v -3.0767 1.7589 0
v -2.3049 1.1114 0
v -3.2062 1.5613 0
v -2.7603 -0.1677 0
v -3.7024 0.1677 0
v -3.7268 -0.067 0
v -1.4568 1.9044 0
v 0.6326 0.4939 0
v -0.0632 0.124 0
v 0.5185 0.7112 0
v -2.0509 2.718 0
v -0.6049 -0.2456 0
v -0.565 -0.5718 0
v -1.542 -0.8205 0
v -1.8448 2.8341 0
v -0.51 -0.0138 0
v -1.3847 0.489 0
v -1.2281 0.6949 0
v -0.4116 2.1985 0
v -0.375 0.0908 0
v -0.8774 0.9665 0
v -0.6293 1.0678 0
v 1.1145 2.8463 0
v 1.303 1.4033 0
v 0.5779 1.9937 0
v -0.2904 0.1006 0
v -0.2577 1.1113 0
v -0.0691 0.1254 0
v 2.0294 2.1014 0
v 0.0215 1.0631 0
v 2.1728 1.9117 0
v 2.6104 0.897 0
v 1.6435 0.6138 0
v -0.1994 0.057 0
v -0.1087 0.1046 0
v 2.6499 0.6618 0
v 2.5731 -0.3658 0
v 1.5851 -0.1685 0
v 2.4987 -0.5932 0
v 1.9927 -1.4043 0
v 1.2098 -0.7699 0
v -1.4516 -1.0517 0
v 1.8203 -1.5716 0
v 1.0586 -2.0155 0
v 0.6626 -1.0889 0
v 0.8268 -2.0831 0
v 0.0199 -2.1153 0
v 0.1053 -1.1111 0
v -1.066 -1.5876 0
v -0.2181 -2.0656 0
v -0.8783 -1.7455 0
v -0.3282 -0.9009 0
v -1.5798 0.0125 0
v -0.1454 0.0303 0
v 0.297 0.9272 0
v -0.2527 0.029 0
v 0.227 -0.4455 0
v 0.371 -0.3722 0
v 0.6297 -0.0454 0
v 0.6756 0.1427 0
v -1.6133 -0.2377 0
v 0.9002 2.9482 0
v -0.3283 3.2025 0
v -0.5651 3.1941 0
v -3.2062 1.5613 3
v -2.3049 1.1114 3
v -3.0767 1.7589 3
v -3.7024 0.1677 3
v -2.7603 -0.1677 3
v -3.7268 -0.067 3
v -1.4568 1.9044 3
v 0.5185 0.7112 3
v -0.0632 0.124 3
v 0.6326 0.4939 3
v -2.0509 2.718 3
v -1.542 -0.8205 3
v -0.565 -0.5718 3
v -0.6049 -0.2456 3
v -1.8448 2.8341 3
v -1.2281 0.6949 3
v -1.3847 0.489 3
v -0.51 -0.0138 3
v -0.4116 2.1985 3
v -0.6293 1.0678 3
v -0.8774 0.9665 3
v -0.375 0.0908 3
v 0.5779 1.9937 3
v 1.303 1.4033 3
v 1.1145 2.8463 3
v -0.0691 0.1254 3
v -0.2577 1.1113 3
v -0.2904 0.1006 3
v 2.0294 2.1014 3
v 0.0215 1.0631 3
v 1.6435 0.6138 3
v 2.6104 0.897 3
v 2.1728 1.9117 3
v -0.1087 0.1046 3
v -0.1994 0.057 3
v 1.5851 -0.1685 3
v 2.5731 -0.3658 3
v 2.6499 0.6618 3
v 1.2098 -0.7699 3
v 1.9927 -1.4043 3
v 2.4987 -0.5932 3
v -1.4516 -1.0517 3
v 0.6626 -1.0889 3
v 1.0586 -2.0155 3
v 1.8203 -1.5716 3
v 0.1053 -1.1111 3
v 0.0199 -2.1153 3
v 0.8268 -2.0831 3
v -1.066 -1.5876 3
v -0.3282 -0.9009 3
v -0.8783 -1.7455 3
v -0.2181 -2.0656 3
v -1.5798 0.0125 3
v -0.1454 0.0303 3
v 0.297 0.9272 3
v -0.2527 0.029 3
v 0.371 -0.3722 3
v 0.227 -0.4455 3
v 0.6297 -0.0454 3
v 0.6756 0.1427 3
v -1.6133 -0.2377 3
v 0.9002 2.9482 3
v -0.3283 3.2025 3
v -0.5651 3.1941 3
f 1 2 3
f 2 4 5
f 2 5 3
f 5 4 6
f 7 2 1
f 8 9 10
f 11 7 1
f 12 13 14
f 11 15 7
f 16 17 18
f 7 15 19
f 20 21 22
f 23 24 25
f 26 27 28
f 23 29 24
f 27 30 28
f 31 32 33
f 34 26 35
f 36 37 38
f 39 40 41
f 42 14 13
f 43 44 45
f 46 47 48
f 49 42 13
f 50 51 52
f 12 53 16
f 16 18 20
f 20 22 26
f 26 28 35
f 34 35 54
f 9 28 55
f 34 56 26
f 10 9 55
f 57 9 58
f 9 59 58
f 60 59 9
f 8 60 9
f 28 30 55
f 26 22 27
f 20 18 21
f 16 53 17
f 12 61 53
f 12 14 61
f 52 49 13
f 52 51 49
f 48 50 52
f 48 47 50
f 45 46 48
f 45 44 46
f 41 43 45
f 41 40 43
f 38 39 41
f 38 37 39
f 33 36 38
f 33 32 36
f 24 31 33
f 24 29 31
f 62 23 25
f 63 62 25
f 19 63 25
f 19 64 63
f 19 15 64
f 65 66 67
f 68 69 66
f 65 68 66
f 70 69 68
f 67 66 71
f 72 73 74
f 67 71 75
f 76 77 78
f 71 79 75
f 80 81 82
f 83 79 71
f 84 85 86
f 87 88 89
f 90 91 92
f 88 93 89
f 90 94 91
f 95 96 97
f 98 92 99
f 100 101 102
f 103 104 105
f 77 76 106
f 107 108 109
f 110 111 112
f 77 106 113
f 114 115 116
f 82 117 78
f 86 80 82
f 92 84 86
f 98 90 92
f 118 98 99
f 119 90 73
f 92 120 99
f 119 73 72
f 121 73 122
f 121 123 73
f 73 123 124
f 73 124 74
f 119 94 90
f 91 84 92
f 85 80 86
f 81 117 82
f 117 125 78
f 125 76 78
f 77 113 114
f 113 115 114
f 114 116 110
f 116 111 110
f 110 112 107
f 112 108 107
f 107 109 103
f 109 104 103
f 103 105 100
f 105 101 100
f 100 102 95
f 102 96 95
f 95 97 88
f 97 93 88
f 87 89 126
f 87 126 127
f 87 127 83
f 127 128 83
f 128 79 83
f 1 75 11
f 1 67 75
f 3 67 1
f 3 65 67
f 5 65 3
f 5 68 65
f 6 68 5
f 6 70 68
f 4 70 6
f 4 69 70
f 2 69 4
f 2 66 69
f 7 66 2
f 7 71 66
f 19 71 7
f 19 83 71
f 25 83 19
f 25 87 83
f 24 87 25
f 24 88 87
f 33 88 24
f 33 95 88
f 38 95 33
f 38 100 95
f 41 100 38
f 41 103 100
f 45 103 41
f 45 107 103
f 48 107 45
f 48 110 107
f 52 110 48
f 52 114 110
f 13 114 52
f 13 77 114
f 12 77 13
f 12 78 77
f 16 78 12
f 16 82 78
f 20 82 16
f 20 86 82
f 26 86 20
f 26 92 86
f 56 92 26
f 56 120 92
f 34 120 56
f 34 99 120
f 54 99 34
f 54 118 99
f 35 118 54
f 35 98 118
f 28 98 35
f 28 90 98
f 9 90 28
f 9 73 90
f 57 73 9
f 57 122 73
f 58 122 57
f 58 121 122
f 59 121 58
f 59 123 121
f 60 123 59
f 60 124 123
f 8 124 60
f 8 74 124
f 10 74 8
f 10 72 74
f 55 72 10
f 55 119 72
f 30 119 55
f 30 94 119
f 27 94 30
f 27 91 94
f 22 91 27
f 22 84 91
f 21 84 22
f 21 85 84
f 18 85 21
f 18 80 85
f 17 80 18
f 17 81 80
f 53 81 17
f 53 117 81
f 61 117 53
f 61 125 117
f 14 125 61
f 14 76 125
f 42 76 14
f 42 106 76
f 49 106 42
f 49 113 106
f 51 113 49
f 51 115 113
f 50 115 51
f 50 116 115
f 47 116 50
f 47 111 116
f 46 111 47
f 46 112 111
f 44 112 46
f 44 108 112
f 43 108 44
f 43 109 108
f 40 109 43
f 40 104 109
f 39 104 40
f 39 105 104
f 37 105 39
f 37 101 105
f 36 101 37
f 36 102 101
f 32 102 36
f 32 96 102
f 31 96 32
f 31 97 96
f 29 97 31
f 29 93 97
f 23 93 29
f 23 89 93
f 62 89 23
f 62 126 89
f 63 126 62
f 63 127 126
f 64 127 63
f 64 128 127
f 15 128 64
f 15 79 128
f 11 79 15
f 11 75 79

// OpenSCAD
pi = 3.1415926536;
e = 2.718281828;

/*************************
* Cartesian equations 
*************************/

/* Archimedes spiral */
module archimedesSpiral(){
    scale([0.02, 0.02, 0.02]) linear_extrude(height=150)
    2dgraph([0, 360*1.5], 50, steps=20, polar=true);
}

/*************************/
// function to convert degrees to radians
function d2r(theta) = theta*360/(2*pi);

// These functions are here to help get the slope of each segment, and use that to find points for a correctly oriented polygon
function diffx(x1, y1, x2, y2, th) = cos(atan((y2-y1)/(x2-x1)) + 90)*(th/2);
function diffy(x1, y1, x2, y2, th) = sin(atan((y2-y1)/(x2-x1)) + 90)*(th/2);
function point1(x1, y1, x2, y2, th) = [x1-diffx(x1, y1, x2, y2, th), y1-diffy(x1, y1, x2, y2, th)];
function point2(x1, y1, x2, y2, th) = [x2-diffx(x1, y1, x2, y2, th), y2-diffy(x1, y1, x2, y2, th)];
function point3(x1, y1, x2, y2, th) = [x2+diffx(x1, y1, x2, y2, th), y2+diffy(x1, y1, x2, y2, th)];
function point4(x1, y1, x2, y2, th) = [x1+diffx(x1, y1, x2, y2, th), y1+diffy(x1, y1, x2, y2, th)];
function polarX(theta) = cos(theta)*r(theta);
function polarY(theta) = sin(theta)*r(theta);

module nextPolygon(x1, y1, x2, y2, x3, y3, th) {
    if((x2 > x1 && x2-diffx(x2, y2, x3, y3, th) < x2-diffx(x1, y1, x2, y2, th) || (x2 <= x1 && x2-diffx(x2, y2, x3, y3, th) > x2-diffx(x1, y1, x2, y2, th)))) {
        polygon(
            points = [
                point1(x1, y1, x2, y2, th),
                point2(x1, y1, x2, y2, th),
                // This point connects this segment to the next
                point4(x2, y2, x3, y3, th),
                point3(x1, y1, x2, y2, th),
                point4(x1, y1, x2, y2, th)
            ],
            paths = [[0,1,2,3,4]]
        );
    }
    else if((x2 > x1 && x2-diffx(x2, y2, x3, y3, th) > x2-diffx(x1, y1, x2, y2, th) || (x2 <= x1 && x2-diffx(x2, y2, x3, y3, th) < x2-diffx(x1, y1, x2, y2, th)))) {
        polygon(
            points = [
                point1(x1, y1, x2, y2, th),
                point2(x1, y1, x2, y2, th),
                // This point connects this segment to the next
                point1(x2, y2, x3, y3, th),
                point3(x1, y1, x2, y2, th),
                point4(x1, y1, x2, y2, th)
            ],
            paths = [[0,1,2,3,4]]
        );
    }
    else {
        polygon(
            points = [
                point1(x1, y1, x2, y2, th),
                point2(x1, y1, x2, y2, th),
                point3(x1, y1, x2, y2, th),
                point4(x1, y1, x2, y2, th)
            ],
            paths = [[0,1,2,3]]
        );
    }
}

module 2dgraph(bounds=[-10,10], th=2, steps=10, polar=false, parametric=false) {

    step = (bounds[1]-bounds[0])/steps;
    union() {
        for(i = [bounds[0]:step:bounds[1]-step]) {
            if(polar) {
                nextPolygon(polarX(i), polarY(i), polarX(i+step), polarY(i+step), polarX(i+2*step), polarY(i+2*step), th);
            }
            else if(parametric) {
                nextPolygon(x(i), y(i), x(i+step), y(i+step), x(i+2*step), y(i+2*step), th);
            }
            else {
                nextPolygon(i, f(i), i+step, f(i+step), i+2*step, f(i+2*step), th);
            }
        }
    }
}

function r(theta) = theta/10.5*pi;
archimedesSpiral();
